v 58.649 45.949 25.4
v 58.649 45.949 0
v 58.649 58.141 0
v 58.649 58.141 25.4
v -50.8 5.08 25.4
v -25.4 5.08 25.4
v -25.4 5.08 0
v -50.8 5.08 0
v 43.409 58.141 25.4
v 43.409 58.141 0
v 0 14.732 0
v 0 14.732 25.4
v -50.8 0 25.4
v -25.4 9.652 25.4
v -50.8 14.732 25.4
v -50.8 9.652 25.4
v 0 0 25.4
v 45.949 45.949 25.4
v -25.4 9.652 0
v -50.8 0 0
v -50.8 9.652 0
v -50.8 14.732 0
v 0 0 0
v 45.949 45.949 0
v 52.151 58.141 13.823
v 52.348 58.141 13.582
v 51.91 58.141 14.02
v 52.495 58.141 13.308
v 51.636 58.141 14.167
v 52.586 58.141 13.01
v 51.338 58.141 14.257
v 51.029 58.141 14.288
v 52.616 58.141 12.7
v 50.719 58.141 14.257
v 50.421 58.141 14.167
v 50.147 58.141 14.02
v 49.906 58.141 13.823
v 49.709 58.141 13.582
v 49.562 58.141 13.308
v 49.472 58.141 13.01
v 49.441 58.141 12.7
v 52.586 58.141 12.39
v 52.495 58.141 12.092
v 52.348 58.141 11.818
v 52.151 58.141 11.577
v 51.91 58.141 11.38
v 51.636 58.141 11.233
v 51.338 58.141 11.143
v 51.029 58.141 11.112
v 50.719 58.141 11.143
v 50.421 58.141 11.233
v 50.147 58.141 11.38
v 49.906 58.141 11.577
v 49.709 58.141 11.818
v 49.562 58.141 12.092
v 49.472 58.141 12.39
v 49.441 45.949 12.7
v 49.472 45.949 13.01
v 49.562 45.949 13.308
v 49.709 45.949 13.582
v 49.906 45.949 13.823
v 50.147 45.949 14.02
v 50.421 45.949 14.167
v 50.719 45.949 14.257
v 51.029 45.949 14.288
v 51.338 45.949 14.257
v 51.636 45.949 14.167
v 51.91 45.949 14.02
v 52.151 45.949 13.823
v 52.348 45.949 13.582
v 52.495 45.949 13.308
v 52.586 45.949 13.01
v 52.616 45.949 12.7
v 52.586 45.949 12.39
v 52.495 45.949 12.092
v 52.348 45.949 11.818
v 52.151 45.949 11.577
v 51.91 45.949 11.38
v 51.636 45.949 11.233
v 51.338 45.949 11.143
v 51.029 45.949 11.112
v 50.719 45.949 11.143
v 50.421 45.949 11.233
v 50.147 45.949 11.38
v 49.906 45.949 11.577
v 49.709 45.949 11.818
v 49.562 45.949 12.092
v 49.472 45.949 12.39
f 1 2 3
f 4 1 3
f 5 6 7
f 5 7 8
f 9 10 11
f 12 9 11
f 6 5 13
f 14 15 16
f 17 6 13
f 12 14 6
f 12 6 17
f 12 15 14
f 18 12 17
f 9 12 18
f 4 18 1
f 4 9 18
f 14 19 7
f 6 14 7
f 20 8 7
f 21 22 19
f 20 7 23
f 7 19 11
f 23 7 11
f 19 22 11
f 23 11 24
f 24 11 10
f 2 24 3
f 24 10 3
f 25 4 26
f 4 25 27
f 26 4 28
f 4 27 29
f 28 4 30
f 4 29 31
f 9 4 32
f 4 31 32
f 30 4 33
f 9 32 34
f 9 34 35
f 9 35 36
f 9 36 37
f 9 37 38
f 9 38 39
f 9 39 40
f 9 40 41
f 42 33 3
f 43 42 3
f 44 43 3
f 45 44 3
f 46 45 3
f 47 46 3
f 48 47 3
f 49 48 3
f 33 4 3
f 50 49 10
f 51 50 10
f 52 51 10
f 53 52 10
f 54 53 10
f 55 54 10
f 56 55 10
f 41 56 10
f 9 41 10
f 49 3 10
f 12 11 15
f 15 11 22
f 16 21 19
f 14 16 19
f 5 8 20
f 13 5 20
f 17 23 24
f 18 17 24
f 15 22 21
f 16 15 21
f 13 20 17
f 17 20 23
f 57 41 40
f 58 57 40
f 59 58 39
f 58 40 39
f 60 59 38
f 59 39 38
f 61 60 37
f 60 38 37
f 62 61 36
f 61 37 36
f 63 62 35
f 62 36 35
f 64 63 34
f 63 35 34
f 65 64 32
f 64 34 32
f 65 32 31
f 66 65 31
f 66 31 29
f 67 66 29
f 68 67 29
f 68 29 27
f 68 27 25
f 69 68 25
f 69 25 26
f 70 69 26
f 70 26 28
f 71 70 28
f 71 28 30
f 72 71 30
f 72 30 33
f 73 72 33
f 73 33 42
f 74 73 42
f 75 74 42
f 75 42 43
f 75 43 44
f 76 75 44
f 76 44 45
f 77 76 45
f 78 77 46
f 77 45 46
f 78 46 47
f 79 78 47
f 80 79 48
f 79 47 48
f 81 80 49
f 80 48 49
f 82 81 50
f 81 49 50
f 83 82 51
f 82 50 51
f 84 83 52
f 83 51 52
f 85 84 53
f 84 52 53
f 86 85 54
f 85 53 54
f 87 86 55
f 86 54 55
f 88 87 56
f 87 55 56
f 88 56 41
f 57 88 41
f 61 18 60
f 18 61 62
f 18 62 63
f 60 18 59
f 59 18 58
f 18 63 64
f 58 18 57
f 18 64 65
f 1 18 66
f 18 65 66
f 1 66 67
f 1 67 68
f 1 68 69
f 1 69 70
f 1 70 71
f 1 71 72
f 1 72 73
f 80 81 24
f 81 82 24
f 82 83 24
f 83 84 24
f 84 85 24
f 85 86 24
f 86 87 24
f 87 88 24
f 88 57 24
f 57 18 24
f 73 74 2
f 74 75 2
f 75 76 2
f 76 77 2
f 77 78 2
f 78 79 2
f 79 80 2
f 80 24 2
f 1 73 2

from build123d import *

# Parameters (mm, degrees)
F1_DEPTH = 25.4
F2_R     = 1.5875
F3_DEPTH = 25.4


with BuildPart() as f1:
    # F0 (on Top) → F1 (new body)
    with BuildSketch(Plane.XY):
        Polygon((-50.8, 0), (0, 0), (45.948514, 45.948514), (58.648514, 45.948514), (58.648514, 58.140514), (43.408514, 58.140514), (0, 14.732), (-50.8, 14.732), (-50.8, 9.652), (-25.4, 9.652), (-25.4, 5.08), (-50.8, 5.08), align=None)
    extrude(amount=F1_DEPTH)

    # F2 (on face) → F3 (cut)
    with BuildSketch(Plane(origin=(0, 58.140514, 0), x_dir=(-1, 0, 0), z_dir=(0, 1, 0))):
        with Locations((-51.028514, 12.7)):
            Circle(F2_R)
    extrude(amount=-F3_DEPTH, mode=Mode.SUBTRACT)


solid = f1.part
